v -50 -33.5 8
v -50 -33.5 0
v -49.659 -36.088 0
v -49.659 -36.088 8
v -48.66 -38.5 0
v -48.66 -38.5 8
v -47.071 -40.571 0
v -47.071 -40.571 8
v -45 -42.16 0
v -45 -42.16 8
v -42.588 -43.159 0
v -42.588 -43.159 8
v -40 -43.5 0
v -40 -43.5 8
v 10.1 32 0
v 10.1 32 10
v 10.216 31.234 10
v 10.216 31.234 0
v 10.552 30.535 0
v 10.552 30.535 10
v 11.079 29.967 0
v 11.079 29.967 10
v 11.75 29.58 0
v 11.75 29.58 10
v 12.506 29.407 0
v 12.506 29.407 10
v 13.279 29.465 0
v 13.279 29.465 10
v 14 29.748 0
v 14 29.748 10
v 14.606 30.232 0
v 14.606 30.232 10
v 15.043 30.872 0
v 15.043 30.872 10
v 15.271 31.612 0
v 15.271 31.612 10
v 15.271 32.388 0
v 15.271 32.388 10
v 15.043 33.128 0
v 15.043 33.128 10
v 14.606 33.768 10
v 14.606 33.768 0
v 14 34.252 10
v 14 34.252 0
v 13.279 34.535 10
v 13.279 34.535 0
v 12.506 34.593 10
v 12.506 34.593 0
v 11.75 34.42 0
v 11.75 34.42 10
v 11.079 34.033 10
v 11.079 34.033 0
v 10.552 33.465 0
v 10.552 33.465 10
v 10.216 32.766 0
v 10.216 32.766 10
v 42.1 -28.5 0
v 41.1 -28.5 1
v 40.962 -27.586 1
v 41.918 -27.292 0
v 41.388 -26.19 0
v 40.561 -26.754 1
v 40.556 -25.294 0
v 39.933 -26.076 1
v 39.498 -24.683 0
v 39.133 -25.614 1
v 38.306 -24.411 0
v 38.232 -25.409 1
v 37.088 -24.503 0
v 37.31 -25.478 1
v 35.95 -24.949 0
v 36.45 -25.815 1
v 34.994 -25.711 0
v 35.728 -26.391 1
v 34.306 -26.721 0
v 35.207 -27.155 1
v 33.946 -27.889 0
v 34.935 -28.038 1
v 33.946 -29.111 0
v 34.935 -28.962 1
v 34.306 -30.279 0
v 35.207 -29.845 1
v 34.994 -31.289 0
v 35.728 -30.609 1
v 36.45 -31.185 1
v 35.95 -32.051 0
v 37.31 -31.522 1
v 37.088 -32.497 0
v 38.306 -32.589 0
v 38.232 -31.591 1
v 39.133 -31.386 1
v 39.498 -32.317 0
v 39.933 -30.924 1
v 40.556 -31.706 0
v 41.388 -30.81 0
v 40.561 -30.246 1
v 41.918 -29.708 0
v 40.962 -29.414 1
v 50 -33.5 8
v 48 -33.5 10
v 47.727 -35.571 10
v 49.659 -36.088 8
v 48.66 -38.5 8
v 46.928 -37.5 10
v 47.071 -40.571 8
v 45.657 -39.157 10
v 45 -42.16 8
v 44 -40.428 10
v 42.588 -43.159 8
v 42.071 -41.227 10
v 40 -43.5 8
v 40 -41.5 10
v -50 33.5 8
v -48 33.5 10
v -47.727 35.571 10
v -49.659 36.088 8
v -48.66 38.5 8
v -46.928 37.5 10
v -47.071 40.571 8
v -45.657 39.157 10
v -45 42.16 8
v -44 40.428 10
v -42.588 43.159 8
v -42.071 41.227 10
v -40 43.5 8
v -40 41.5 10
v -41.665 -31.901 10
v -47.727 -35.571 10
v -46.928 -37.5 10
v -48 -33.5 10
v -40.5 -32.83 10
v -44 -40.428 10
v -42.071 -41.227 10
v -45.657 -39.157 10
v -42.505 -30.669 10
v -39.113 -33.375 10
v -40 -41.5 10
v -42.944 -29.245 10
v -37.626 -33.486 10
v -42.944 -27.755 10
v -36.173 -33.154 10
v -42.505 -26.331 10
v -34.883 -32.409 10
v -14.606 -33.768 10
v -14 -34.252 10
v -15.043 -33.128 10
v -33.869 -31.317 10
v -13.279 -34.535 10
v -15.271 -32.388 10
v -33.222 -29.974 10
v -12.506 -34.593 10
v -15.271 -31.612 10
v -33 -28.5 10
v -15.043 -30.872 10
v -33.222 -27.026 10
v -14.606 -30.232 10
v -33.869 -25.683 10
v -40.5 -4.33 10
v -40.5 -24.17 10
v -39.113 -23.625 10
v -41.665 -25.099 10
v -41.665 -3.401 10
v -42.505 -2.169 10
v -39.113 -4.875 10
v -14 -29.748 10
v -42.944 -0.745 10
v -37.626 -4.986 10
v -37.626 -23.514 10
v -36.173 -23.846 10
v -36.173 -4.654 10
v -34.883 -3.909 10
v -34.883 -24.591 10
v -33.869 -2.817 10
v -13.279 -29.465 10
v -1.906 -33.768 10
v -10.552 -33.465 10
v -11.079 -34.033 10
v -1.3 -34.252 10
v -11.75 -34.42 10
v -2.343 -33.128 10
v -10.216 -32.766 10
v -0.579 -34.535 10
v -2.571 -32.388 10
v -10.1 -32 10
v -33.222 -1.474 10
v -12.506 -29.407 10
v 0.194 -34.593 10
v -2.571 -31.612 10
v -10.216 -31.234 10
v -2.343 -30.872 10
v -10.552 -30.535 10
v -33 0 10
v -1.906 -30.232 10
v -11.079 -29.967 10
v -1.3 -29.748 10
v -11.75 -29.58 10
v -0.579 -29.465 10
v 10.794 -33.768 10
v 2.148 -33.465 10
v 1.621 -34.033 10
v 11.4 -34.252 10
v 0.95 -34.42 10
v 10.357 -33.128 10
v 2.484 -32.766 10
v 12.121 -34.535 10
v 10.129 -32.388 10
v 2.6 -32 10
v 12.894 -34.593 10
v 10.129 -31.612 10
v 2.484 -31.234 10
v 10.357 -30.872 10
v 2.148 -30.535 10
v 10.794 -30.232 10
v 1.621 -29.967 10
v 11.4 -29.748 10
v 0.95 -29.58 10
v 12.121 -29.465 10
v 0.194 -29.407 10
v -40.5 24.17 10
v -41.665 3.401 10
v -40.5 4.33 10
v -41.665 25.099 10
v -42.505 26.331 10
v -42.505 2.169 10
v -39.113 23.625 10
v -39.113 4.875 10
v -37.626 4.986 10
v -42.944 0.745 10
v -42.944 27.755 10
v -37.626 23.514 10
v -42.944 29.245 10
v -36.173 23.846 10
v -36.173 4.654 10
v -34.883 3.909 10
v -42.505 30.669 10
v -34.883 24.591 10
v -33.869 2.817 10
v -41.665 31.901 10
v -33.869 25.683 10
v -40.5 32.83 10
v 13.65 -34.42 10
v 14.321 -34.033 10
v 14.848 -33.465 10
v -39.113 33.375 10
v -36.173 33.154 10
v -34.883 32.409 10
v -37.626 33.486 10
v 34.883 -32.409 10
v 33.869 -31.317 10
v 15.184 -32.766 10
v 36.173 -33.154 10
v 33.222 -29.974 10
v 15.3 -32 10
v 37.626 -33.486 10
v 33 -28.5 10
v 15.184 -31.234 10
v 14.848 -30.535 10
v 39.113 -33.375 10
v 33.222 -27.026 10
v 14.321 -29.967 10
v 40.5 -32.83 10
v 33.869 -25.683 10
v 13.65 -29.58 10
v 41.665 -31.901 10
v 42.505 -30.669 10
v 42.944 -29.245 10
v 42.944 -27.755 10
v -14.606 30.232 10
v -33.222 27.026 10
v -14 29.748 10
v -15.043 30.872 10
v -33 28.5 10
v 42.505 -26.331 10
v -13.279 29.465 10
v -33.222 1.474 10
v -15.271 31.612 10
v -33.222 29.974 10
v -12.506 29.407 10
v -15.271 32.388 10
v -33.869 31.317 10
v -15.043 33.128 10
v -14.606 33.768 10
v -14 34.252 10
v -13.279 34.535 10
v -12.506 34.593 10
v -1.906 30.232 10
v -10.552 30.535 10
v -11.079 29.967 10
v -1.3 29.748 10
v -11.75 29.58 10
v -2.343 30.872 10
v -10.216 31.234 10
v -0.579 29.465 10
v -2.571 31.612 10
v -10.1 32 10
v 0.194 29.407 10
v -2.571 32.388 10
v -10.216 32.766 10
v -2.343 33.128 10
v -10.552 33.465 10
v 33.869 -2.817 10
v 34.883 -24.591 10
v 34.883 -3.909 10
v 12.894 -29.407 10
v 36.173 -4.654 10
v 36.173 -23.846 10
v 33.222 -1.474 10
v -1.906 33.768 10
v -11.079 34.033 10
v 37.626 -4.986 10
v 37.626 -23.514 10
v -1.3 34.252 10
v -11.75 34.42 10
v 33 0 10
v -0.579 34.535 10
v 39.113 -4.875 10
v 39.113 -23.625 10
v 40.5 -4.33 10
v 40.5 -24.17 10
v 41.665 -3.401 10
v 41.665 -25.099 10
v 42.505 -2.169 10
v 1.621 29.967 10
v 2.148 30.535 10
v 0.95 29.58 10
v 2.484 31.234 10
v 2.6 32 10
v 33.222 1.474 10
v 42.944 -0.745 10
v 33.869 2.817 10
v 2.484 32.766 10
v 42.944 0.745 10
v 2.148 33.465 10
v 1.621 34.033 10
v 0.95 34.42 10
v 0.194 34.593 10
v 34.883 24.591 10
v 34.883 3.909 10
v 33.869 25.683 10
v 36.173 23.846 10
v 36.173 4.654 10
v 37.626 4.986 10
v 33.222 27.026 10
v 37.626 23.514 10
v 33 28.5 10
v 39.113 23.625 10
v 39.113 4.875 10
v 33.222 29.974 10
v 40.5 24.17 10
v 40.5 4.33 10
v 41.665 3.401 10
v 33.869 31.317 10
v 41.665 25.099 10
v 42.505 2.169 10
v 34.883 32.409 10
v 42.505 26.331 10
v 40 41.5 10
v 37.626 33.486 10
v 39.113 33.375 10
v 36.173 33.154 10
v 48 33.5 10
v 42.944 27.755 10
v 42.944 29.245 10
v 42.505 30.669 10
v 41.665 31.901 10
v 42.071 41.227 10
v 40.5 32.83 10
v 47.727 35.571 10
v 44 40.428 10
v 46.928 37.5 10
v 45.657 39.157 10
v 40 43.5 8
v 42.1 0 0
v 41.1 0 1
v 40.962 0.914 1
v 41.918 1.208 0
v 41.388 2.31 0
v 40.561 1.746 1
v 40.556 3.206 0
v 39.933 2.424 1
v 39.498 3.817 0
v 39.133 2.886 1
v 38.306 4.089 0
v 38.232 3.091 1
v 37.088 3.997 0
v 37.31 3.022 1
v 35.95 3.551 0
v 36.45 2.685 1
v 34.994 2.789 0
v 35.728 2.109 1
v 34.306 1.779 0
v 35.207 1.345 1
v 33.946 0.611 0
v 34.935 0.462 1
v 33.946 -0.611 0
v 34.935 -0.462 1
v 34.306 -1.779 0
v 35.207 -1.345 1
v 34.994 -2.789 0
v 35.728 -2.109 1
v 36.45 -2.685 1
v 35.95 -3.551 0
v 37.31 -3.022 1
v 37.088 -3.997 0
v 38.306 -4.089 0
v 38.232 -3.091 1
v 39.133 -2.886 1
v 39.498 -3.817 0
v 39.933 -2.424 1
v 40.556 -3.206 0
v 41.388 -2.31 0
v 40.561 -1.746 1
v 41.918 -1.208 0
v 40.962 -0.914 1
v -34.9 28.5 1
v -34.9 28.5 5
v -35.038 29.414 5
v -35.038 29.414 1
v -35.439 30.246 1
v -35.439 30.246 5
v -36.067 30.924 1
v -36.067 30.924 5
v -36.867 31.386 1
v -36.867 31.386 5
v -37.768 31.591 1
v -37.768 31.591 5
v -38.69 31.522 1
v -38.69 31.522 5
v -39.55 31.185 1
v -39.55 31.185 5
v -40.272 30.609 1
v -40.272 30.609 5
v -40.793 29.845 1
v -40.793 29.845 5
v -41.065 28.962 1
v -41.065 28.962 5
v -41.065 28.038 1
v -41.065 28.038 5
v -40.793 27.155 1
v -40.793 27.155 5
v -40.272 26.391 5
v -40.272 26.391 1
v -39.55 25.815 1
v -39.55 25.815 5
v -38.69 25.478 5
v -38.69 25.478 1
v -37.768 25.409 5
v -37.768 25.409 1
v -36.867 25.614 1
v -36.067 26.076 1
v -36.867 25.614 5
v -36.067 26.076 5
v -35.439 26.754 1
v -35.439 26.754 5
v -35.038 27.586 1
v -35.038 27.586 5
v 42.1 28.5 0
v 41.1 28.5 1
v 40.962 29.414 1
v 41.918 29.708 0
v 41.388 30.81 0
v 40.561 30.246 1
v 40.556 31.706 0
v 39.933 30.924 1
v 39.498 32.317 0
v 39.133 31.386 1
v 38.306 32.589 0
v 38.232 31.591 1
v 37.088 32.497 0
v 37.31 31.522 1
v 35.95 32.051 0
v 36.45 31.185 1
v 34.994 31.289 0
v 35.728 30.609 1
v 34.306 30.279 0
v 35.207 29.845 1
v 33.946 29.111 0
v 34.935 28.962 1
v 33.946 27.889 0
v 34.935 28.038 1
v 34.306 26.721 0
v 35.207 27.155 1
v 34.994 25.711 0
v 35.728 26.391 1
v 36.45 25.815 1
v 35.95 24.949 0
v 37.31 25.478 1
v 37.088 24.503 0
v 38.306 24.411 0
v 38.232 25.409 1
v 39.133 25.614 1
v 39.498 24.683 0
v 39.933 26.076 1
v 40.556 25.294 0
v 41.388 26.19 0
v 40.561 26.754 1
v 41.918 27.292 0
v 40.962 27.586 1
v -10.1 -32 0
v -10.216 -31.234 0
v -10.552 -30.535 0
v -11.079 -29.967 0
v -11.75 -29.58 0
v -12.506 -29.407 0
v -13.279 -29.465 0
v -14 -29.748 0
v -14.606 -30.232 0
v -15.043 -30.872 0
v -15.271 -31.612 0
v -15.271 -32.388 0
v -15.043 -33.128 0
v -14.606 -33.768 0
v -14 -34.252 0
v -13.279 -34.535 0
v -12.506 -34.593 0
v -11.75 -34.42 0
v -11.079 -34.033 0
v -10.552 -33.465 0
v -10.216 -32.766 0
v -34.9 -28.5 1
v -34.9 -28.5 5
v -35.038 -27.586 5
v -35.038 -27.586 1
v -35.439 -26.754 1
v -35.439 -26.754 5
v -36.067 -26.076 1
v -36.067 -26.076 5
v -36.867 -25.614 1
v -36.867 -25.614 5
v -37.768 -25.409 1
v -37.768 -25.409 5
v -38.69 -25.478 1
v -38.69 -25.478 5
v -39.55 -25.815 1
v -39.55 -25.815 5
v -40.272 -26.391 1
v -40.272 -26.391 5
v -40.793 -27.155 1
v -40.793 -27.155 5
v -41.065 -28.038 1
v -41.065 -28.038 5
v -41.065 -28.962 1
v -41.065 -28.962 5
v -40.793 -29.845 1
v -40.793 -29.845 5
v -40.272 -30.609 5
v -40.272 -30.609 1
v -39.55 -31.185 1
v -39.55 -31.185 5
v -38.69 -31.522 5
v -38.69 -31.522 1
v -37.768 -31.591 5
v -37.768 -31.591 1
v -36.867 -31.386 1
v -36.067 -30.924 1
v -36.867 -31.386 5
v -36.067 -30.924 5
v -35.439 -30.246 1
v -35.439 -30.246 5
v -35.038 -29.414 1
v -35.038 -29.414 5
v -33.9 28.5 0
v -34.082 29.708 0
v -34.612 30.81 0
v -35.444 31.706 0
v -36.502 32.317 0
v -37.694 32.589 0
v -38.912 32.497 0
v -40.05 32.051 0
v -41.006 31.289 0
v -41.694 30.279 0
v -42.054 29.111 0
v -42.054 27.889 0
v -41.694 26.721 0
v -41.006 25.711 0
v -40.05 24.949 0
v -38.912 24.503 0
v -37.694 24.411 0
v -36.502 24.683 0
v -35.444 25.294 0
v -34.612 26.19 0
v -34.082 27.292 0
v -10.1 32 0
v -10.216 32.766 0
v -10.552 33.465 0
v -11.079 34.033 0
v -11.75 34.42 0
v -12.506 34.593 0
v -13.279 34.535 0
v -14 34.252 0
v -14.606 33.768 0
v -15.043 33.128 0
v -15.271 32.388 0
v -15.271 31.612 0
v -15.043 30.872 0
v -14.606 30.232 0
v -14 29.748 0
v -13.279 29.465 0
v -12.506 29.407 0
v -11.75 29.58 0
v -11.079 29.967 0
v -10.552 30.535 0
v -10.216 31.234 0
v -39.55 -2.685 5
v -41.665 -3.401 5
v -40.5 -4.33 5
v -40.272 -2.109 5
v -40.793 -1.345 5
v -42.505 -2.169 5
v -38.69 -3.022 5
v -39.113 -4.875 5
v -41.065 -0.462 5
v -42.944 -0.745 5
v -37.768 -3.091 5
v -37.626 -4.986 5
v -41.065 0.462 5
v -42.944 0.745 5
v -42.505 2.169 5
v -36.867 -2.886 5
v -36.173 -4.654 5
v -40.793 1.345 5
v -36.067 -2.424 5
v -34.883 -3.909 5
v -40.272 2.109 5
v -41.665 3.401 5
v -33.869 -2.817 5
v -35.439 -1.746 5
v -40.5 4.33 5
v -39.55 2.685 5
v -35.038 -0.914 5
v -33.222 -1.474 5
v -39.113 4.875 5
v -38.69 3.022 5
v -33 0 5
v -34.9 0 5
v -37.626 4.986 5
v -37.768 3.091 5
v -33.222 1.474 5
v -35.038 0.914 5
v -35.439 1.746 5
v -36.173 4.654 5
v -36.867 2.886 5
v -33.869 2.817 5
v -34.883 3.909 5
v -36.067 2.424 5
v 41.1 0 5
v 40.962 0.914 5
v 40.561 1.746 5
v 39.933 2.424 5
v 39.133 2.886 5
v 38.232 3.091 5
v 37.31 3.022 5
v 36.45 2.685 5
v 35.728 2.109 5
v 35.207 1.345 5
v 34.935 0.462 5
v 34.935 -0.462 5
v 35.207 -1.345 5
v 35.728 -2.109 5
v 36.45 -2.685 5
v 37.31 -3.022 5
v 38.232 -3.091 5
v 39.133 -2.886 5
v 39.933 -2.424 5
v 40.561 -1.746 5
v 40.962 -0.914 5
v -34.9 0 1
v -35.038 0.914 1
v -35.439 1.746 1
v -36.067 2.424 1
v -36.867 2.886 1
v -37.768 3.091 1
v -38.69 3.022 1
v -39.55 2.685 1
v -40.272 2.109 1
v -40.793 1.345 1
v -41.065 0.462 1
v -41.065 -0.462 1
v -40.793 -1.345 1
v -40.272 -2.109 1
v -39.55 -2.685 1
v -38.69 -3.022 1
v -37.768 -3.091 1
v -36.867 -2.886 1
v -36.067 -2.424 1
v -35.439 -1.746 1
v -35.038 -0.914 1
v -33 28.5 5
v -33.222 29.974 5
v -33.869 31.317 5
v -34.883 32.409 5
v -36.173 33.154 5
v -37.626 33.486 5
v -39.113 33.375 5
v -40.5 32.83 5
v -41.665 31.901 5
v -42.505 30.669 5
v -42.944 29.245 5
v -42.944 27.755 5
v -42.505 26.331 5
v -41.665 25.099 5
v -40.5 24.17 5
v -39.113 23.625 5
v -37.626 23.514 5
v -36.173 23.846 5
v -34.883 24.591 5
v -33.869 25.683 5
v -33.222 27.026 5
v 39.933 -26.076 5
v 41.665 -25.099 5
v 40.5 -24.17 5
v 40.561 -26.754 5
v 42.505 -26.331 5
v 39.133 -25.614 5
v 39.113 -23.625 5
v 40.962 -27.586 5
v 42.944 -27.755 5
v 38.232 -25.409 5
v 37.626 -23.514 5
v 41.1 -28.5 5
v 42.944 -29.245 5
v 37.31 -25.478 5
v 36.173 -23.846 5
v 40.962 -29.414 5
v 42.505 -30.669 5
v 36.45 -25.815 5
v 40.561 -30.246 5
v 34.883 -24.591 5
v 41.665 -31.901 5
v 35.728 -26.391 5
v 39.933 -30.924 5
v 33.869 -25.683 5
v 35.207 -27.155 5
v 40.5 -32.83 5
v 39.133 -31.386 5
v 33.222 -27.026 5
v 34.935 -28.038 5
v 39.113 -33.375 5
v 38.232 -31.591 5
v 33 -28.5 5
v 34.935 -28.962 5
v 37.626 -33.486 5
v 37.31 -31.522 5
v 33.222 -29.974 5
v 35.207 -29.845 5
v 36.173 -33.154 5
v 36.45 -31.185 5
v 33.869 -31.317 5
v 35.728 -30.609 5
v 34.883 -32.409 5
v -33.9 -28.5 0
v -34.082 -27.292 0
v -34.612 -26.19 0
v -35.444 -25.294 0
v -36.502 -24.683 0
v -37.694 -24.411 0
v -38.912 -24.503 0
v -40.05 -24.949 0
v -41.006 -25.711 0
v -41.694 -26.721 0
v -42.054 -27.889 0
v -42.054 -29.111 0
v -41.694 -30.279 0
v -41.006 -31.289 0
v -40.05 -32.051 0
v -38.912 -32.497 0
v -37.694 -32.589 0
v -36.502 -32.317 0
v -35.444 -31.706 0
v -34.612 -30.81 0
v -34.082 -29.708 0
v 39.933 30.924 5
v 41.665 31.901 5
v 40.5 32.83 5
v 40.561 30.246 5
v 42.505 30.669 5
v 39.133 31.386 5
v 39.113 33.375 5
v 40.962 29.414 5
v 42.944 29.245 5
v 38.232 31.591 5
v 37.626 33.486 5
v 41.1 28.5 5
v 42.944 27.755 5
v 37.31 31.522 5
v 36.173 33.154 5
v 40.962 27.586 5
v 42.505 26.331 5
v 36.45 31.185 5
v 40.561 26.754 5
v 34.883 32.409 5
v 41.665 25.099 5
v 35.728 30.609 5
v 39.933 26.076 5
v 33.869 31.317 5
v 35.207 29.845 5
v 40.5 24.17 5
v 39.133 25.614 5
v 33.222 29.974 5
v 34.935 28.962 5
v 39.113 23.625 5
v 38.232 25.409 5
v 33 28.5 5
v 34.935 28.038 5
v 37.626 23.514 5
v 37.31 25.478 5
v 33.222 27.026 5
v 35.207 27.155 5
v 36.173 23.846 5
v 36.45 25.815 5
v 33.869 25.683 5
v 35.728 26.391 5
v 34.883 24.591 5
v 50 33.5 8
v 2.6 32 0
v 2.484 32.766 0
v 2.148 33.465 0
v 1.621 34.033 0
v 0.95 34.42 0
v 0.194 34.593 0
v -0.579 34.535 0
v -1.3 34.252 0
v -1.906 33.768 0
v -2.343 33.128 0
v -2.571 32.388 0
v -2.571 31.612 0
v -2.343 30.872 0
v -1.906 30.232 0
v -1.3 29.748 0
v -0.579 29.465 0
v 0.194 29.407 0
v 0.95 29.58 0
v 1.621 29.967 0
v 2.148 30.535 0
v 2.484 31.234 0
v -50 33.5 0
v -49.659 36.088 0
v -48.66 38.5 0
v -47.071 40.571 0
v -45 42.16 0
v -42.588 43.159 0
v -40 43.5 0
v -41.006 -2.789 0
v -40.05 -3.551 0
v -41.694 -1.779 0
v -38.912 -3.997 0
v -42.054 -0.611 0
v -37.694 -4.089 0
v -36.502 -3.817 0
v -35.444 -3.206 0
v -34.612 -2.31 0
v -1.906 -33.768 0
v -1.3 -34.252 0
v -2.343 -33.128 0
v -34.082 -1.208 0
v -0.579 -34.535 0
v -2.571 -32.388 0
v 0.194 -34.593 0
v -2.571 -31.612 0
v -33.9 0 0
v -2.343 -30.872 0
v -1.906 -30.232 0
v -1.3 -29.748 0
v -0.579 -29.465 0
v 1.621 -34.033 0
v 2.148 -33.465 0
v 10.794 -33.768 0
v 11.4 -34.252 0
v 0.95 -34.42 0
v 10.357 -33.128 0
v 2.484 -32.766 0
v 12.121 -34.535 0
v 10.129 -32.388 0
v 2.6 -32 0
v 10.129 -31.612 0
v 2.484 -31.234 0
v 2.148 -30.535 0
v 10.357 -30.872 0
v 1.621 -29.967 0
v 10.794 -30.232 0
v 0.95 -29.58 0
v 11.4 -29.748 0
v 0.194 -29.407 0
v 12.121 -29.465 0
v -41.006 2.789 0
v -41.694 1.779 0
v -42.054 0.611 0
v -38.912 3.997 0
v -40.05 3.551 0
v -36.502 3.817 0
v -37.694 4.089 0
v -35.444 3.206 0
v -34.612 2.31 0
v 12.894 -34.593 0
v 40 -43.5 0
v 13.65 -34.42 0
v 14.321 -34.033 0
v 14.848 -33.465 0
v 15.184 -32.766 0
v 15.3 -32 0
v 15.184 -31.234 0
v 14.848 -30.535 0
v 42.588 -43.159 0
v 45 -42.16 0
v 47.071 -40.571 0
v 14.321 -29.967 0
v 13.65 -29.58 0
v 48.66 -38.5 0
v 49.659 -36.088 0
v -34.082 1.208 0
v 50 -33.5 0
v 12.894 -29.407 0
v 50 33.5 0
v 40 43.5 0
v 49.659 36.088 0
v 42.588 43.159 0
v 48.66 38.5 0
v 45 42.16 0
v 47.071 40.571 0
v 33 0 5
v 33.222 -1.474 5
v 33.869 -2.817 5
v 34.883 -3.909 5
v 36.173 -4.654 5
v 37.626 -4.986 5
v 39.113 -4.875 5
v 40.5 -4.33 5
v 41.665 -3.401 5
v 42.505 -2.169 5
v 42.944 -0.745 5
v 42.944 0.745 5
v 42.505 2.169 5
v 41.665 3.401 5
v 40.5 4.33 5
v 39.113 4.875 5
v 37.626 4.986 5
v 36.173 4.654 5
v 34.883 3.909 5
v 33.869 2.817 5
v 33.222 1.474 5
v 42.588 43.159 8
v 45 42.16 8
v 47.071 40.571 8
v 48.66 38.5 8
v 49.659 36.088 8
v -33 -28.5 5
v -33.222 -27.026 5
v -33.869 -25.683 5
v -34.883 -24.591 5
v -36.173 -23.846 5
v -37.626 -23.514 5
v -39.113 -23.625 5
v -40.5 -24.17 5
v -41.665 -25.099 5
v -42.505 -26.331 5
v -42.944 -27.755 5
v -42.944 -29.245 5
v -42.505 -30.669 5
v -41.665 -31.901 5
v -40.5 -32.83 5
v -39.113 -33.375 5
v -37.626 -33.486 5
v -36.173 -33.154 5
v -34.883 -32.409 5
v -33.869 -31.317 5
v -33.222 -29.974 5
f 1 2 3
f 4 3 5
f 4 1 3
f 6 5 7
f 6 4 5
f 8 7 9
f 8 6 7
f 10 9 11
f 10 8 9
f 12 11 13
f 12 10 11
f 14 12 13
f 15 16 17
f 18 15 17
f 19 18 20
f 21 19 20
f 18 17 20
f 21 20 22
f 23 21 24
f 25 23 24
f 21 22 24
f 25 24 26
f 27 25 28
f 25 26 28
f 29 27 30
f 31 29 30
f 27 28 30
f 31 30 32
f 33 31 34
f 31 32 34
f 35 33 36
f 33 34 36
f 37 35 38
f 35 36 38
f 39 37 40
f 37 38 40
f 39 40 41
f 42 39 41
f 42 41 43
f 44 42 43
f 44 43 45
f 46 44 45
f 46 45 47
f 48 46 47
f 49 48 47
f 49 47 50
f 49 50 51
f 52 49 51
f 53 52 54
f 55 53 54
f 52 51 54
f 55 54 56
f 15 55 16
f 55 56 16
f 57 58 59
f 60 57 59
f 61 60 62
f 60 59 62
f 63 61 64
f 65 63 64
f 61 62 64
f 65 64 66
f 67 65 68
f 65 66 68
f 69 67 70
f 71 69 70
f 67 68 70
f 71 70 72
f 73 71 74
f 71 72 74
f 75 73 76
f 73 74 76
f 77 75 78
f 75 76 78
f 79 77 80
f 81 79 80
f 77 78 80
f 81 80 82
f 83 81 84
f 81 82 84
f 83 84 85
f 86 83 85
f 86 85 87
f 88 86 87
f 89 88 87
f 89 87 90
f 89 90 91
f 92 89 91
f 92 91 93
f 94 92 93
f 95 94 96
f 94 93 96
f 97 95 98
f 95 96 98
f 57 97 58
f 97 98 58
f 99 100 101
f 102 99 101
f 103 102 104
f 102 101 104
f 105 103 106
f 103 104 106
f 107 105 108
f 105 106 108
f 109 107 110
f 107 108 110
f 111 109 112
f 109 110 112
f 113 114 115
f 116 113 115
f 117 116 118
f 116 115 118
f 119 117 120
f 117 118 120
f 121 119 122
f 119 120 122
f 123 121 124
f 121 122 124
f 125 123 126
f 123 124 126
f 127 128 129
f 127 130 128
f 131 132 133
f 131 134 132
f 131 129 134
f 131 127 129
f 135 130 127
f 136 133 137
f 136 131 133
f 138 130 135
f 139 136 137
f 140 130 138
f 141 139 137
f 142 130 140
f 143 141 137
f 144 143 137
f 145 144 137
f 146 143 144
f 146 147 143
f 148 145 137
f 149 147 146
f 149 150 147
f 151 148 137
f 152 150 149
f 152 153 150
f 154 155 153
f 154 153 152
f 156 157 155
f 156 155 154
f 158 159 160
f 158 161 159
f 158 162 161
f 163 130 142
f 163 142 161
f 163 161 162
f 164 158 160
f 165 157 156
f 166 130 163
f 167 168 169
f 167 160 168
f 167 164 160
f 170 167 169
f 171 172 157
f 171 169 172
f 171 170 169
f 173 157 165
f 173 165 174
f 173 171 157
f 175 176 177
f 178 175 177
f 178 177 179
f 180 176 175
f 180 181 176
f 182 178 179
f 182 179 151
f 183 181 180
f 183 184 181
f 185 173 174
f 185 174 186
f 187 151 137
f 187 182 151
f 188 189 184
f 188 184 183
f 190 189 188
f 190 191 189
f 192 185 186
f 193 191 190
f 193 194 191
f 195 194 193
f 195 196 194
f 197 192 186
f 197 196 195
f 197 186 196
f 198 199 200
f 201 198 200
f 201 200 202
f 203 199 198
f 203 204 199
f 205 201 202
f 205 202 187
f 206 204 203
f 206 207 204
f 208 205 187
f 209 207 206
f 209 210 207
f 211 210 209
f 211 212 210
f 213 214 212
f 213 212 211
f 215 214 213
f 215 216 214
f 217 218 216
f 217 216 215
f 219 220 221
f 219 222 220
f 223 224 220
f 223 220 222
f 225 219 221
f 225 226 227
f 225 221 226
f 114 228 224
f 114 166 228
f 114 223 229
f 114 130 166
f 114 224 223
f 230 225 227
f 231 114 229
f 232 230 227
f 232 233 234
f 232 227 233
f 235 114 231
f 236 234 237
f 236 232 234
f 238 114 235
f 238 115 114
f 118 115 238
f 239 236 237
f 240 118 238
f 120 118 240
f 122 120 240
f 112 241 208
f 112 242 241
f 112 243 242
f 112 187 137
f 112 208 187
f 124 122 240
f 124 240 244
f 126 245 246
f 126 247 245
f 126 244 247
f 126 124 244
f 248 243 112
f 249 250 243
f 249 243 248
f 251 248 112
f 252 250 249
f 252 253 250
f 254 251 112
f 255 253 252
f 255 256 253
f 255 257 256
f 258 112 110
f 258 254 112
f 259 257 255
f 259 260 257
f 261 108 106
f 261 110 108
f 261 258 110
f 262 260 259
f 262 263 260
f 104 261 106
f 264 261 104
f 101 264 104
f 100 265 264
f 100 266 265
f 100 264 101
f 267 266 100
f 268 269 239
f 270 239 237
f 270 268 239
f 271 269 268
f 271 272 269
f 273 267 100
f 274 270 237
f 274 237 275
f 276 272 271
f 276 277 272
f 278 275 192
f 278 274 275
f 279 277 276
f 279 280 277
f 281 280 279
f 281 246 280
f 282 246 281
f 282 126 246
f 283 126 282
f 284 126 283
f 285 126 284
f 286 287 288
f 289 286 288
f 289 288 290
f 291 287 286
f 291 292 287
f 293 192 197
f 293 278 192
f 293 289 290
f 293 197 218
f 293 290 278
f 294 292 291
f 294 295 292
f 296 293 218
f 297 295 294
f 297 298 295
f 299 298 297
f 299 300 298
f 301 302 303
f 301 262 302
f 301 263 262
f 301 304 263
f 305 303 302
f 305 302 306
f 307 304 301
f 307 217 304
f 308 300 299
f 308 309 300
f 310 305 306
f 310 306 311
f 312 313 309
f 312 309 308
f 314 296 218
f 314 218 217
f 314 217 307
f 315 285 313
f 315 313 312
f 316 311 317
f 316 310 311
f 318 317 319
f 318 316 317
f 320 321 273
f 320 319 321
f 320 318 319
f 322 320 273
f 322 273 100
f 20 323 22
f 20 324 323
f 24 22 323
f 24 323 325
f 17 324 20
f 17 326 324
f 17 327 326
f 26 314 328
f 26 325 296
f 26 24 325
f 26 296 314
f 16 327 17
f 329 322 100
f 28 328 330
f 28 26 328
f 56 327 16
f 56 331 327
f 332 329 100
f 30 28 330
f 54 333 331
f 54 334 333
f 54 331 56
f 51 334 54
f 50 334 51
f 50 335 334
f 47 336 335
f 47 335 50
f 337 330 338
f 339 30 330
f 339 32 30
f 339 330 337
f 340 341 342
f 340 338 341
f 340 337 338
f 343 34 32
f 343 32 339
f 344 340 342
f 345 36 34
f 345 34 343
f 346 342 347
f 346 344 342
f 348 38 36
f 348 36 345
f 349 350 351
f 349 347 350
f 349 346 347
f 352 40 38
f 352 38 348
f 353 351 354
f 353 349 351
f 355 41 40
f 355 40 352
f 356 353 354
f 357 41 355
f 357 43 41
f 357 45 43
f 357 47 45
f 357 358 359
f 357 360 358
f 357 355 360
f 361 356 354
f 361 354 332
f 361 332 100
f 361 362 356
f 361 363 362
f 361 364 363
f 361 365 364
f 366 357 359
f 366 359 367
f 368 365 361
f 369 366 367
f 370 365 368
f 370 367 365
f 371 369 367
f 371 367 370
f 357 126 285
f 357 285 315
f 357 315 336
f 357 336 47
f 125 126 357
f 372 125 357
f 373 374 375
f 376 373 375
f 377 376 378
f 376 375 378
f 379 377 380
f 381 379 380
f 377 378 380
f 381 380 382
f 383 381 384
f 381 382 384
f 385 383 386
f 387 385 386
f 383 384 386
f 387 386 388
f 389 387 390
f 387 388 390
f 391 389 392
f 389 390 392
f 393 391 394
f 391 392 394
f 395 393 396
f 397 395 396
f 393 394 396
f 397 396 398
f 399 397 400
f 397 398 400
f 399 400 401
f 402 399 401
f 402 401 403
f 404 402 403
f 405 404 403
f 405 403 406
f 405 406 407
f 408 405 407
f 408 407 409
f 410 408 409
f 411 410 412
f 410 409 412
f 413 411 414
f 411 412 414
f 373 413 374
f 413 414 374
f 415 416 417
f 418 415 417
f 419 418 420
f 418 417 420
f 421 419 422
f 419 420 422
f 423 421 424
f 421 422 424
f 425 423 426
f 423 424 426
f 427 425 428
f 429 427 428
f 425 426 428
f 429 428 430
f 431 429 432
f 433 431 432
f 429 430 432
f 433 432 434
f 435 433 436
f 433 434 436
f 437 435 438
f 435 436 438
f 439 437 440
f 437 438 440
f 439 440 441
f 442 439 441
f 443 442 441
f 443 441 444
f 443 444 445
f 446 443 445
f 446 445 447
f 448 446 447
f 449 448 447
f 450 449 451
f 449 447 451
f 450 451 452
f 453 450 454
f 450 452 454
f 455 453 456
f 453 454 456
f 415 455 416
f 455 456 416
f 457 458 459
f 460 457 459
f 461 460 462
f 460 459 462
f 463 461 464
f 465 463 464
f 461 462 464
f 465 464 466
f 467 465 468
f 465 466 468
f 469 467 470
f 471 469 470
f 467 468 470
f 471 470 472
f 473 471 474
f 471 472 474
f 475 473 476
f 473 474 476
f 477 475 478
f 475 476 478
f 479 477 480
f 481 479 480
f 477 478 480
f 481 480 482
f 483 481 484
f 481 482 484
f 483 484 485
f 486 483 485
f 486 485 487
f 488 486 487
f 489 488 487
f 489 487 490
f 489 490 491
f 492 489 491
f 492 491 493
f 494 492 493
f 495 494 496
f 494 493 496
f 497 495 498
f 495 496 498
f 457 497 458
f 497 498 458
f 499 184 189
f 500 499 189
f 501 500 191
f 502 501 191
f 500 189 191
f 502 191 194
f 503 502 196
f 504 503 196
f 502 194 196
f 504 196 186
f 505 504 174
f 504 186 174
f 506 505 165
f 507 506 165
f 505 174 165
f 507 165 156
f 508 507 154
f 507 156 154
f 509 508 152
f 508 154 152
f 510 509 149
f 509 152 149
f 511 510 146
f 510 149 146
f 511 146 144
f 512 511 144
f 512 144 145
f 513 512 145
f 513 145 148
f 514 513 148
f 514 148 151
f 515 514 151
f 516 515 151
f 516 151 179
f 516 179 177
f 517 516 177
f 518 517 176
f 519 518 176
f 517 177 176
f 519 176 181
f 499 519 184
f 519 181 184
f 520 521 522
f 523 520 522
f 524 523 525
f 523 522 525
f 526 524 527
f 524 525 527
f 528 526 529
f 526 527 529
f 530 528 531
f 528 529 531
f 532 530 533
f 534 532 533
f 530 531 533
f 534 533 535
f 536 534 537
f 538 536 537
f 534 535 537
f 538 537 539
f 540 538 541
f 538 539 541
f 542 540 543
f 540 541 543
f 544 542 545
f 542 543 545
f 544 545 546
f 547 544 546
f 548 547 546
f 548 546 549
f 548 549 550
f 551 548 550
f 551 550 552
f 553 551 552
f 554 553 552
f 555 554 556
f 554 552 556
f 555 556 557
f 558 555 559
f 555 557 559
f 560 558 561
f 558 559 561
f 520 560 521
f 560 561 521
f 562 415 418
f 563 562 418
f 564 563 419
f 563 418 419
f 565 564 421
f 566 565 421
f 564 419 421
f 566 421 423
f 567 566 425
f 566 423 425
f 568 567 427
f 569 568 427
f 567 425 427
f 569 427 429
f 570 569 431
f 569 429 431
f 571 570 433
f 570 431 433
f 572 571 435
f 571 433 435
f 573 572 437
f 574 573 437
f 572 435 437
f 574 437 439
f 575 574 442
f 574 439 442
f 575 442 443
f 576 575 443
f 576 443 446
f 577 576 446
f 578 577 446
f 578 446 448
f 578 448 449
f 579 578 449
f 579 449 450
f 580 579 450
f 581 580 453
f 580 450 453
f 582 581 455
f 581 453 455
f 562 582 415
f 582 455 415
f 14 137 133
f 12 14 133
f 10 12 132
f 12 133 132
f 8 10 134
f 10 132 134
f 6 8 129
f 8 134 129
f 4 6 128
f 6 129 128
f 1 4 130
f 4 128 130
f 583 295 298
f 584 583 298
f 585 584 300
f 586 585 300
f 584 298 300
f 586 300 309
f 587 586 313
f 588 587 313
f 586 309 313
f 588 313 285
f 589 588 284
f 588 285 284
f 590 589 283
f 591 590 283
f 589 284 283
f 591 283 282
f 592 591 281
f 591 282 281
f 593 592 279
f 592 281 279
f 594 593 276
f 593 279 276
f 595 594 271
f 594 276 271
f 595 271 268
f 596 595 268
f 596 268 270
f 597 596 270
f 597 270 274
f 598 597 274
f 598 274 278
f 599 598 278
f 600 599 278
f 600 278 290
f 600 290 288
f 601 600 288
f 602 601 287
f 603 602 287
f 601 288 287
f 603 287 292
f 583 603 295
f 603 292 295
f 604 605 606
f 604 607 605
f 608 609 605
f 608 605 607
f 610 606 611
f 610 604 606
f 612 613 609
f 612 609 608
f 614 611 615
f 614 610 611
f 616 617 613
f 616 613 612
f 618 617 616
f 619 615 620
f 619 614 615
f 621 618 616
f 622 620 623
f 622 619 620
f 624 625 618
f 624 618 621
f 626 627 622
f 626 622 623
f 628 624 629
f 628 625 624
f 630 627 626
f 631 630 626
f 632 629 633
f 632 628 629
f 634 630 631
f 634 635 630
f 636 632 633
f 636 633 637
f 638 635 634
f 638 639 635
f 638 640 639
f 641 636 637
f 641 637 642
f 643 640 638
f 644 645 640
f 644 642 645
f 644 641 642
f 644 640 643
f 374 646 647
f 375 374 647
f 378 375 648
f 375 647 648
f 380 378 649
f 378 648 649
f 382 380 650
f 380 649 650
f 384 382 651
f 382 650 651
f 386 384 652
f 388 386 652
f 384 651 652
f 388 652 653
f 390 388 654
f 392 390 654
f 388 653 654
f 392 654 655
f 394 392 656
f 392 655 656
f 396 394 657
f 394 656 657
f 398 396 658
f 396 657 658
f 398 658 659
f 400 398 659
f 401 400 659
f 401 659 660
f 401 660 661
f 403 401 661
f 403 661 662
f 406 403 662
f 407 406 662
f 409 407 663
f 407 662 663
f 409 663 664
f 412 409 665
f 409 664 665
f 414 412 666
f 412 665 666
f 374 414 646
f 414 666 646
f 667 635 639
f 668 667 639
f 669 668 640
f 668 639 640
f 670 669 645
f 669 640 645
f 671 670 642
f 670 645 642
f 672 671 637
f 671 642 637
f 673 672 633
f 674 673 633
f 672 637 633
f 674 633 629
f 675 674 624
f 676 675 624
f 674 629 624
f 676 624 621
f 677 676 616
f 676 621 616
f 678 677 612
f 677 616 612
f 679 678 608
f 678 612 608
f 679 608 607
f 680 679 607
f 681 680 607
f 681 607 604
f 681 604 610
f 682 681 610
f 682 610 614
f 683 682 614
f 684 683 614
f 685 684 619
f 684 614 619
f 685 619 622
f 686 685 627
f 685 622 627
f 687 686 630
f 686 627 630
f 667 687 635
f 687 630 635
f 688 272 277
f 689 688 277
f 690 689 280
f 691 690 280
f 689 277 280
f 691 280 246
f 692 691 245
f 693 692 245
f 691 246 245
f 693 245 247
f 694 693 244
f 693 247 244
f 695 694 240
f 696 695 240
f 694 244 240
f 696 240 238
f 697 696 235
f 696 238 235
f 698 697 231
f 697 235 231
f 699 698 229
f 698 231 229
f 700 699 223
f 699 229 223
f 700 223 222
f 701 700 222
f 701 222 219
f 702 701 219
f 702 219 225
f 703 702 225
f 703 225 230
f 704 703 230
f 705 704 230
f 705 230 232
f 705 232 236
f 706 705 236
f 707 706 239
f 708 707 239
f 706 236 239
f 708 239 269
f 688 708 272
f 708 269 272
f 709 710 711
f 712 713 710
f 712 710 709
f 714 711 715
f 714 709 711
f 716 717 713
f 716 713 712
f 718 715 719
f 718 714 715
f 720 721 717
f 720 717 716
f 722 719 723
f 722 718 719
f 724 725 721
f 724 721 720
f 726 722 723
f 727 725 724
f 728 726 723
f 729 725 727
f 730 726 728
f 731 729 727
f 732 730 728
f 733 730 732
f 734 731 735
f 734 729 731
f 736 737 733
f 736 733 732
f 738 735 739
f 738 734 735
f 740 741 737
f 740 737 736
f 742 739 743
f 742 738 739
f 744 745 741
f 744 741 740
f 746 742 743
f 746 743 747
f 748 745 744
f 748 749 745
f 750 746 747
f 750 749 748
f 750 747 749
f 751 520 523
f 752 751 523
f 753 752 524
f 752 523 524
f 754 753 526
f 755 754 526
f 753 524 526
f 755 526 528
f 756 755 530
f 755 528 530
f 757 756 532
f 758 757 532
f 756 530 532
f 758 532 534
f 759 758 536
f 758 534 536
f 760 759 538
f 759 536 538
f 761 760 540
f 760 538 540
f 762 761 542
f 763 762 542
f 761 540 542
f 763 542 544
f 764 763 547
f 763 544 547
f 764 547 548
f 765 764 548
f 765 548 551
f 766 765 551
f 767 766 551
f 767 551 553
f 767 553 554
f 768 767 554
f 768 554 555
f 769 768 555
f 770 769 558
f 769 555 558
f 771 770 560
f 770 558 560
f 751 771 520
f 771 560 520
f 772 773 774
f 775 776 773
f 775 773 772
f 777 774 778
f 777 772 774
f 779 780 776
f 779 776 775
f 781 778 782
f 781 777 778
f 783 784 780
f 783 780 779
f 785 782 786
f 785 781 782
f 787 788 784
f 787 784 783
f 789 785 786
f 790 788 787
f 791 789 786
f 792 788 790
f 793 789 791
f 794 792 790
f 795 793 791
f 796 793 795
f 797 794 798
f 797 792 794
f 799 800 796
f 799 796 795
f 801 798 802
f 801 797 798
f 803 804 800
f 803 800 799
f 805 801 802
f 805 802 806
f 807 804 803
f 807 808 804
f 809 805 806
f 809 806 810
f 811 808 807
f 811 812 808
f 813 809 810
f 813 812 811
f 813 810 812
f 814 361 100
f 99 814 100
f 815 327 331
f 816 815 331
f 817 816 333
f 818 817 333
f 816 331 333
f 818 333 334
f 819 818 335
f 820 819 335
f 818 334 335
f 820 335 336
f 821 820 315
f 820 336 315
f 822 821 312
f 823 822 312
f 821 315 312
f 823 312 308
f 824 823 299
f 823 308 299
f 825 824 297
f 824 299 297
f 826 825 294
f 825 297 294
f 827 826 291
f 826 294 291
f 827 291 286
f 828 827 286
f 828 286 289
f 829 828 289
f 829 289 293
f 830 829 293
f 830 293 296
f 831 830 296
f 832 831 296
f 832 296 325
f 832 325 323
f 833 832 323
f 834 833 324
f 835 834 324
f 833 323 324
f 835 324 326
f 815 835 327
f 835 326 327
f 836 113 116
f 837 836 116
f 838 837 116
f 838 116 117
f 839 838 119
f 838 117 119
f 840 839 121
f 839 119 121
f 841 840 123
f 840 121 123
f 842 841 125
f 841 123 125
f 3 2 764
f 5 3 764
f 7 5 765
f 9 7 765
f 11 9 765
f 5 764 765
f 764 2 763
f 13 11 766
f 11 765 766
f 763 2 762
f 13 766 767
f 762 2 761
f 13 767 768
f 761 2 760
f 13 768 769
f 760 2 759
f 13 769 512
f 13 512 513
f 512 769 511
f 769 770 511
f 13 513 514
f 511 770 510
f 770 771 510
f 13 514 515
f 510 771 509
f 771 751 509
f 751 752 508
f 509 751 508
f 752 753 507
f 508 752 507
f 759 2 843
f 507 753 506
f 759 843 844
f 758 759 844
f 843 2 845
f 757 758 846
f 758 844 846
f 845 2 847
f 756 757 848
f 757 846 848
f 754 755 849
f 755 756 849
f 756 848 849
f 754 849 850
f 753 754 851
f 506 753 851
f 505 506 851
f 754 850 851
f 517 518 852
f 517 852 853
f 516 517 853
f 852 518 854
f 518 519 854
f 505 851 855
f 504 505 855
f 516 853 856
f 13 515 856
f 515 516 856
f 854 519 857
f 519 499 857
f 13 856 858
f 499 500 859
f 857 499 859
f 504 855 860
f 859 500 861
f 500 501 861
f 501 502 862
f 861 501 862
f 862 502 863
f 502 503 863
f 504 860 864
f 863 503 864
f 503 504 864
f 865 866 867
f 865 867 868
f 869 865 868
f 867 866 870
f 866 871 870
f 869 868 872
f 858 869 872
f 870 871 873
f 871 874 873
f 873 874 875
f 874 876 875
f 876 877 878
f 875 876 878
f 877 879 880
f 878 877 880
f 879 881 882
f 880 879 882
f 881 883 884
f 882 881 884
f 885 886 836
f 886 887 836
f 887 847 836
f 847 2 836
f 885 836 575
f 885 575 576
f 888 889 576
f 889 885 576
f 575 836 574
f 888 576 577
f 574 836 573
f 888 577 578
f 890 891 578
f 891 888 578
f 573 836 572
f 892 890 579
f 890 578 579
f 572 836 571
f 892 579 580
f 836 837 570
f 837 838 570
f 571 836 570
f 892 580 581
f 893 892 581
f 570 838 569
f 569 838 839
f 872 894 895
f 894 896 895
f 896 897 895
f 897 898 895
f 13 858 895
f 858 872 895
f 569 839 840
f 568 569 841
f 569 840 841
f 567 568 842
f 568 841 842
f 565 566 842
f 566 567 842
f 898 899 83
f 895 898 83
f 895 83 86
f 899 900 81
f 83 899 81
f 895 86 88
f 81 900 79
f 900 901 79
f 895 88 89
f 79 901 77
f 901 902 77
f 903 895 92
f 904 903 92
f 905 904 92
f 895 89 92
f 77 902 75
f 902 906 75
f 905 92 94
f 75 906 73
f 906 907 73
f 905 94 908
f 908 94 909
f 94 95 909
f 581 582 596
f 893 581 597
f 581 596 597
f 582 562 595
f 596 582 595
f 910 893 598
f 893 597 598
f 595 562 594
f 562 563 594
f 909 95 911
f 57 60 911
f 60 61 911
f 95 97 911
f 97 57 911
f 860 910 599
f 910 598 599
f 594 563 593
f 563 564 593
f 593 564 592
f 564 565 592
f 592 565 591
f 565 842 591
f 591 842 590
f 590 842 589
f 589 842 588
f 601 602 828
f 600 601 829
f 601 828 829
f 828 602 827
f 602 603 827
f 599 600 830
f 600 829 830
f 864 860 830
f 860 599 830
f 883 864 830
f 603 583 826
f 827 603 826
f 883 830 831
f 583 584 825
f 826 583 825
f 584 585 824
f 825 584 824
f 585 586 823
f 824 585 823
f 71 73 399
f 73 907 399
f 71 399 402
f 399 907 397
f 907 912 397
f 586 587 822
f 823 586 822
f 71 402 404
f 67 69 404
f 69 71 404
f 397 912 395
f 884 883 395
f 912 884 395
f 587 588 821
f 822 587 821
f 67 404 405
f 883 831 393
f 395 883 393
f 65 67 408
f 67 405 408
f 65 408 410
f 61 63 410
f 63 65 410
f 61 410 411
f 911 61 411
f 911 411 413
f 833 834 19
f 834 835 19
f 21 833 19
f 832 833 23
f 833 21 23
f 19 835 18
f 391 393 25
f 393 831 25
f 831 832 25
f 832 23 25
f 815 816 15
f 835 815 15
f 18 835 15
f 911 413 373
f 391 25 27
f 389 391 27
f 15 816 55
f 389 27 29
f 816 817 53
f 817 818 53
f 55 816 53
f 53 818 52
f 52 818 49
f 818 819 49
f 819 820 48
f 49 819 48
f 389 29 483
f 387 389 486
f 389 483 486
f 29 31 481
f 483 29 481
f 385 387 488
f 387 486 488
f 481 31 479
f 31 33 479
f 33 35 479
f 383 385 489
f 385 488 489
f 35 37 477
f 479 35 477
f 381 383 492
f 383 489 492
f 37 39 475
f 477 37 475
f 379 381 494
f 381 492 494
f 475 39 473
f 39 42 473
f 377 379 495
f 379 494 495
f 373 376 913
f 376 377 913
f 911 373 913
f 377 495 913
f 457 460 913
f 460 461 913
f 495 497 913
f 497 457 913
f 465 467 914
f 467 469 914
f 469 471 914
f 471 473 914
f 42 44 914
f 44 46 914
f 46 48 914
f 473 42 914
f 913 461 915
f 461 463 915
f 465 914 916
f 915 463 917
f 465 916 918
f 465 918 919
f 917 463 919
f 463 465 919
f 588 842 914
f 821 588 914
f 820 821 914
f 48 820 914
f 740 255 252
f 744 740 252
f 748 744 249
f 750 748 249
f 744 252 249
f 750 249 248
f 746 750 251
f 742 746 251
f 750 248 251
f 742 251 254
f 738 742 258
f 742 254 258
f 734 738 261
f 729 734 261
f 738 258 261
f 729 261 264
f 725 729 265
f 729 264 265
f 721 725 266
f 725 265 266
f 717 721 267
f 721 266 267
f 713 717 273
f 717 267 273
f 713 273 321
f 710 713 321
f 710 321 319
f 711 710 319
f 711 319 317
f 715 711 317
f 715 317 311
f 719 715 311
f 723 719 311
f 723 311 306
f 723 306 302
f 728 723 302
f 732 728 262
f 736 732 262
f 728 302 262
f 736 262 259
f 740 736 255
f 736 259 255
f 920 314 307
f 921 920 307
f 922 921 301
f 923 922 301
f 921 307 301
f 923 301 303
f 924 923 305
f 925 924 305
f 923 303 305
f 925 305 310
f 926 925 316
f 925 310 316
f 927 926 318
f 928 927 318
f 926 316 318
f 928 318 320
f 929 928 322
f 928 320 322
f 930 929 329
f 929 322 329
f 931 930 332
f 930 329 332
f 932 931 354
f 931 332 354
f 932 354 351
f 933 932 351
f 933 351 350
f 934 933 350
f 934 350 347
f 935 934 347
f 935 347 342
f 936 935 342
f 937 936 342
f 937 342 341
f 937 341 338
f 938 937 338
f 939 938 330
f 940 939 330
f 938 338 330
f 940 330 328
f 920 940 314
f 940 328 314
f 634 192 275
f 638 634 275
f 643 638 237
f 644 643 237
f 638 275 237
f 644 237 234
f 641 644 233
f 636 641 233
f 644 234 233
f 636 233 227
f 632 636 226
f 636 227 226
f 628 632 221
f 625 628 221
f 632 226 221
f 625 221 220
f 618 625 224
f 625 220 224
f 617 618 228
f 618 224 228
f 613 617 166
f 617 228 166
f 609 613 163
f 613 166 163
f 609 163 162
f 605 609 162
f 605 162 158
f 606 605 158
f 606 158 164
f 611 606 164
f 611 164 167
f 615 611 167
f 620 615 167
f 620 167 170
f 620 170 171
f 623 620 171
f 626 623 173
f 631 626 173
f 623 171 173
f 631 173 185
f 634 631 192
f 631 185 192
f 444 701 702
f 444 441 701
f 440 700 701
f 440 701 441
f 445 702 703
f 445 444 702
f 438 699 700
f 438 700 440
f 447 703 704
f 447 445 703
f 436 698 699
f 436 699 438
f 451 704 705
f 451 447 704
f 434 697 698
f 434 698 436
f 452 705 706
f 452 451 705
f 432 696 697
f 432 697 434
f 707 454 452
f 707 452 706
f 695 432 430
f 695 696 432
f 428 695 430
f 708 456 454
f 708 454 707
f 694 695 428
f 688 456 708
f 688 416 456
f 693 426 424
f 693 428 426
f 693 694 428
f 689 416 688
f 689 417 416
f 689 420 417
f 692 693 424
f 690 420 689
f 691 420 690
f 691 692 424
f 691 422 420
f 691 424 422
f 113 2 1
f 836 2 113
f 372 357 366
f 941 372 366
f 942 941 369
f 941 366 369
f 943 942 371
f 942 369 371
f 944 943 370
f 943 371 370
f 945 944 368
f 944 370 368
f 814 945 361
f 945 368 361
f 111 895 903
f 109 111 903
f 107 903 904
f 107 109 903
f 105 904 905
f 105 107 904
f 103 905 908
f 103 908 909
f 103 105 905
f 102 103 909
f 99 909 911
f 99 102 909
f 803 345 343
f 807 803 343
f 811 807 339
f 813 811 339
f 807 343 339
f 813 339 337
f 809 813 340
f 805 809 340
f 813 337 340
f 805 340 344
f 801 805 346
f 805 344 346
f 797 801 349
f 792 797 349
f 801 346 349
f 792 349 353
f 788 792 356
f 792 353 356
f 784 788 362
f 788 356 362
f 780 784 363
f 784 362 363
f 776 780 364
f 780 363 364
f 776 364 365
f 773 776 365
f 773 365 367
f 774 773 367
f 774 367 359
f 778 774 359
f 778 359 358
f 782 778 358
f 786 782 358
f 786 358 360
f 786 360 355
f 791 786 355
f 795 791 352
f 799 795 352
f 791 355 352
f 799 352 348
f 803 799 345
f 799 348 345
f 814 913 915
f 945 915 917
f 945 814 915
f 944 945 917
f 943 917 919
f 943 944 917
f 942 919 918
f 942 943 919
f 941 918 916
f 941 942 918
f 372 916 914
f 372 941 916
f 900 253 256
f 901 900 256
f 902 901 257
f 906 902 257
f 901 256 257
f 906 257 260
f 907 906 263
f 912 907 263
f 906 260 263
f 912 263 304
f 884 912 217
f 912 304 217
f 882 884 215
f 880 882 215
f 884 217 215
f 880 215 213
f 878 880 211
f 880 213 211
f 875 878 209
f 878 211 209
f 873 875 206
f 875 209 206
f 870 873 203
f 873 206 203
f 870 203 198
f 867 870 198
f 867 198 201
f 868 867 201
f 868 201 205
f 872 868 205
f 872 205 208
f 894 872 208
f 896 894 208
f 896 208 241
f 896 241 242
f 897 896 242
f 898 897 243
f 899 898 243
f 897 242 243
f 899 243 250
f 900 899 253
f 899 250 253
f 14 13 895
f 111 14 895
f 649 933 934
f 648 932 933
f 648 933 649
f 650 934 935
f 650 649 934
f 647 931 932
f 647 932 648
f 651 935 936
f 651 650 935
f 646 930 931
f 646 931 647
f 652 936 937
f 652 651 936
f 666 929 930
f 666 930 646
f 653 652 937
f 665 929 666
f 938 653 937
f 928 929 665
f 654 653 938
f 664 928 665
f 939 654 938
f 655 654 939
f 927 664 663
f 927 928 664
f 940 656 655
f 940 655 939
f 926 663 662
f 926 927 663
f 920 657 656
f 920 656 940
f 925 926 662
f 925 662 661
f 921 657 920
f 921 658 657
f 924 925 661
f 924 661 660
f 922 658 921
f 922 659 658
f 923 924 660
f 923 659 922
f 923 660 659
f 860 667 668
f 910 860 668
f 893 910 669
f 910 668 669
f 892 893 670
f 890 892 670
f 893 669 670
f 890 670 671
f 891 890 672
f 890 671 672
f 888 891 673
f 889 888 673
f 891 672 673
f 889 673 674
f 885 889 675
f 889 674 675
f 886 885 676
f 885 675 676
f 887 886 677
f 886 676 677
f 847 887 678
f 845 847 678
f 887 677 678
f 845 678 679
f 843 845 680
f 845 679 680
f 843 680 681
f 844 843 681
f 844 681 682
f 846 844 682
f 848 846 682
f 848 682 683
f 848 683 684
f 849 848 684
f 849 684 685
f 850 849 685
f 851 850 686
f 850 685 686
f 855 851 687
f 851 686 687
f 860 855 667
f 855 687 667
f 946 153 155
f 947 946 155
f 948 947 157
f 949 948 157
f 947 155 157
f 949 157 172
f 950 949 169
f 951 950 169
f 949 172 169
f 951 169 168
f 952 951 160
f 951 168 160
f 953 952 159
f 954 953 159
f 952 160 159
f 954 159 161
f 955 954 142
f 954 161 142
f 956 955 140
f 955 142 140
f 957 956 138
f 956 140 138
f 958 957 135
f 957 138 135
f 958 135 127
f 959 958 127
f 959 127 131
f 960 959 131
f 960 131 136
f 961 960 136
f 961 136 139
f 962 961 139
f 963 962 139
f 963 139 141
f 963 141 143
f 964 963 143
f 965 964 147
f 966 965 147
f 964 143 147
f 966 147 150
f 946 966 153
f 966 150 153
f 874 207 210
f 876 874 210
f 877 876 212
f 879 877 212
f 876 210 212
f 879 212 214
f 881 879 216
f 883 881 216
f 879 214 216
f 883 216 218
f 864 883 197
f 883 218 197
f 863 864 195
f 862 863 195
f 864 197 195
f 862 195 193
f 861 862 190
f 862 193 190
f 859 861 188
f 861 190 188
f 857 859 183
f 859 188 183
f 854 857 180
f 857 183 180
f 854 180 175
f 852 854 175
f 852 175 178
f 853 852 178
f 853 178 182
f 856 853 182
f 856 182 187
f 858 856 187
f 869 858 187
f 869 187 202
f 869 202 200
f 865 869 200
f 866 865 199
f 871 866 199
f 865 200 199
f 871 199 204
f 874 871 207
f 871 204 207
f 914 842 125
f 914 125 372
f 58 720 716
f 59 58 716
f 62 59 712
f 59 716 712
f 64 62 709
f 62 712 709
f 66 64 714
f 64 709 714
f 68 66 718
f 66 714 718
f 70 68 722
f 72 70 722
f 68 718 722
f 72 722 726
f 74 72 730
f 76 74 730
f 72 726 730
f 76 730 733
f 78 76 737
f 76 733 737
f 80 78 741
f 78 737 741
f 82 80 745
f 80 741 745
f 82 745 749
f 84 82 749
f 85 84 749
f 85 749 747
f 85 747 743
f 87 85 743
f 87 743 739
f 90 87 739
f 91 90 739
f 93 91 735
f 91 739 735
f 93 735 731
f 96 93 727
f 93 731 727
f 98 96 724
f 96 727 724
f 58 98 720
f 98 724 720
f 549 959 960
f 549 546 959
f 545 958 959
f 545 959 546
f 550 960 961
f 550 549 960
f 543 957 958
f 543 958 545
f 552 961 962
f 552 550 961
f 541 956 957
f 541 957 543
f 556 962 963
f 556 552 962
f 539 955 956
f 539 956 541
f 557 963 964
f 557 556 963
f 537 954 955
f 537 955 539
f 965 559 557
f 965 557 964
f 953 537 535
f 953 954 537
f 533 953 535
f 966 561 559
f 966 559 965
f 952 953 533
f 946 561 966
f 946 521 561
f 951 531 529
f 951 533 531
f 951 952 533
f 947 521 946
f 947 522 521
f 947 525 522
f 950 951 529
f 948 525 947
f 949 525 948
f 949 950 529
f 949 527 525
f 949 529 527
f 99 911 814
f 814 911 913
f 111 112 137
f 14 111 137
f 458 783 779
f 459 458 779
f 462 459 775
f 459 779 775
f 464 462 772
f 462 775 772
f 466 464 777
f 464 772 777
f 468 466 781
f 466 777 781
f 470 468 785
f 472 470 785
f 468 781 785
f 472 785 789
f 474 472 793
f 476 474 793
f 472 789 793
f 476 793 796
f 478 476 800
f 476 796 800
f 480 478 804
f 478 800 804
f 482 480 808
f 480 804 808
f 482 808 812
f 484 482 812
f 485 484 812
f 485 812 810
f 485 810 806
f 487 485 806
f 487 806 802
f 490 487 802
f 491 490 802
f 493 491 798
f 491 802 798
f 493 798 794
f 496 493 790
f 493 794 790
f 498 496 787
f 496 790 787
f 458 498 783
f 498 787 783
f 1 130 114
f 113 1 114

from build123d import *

# Parameters (mm, degrees)
SKETCH_1_W          = 100
SKETCH_1_H          = 87
EXTRUDE_1_DEPTH     = 10
FILLET_1_R          = 10
SKETCH_2_R          = 2.6
CUT_EXTRUDE_1_DEPTH = 10
SKETCH_3_R          = 5
CUT_EXTRUDE_2_DEPTH = 5
SKETCH_4_R          = 3.1
CUT_EXTRUDE_3_DEPTH = 5
CHAMFER_1_SIZE      = 1
CHAMFER_2_SIZE      = 2


with BuildPart() as part:
    # 草图1 → 凸台-拉伸1 (new body)
    with BuildSketch(Plane.XY):
        Rectangle(SKETCH_1_W, SKETCH_1_H)
    extrude(amount=EXTRUDE_1_DEPTH)

    # 圆角1
    fillet_1_edges = [part.edges().sort_by_distance(p)[0] for p in [
        (50, -43.5, 5),
        (-50, -43.5, 5),
        (-50, 43.5, 5),
        (50, 43.5, 5),
    ]]
    fillet(fillet_1_edges, radius=FILLET_1_R)

    # 草图2 → 切除-拉伸1 (cut)
    with BuildSketch(Plane.XY.offset(10)):
        with Locations((0, 32)):
            Circle(SKETCH_2_R)
        with Locations((-12.7, 32)):
            Circle(SKETCH_2_R)
        with Locations(Location((12.7, 32, 0), (0, 0, 180))):
            Circle(SKETCH_2_R)
        with Locations((-12.7, -32)):
            Circle(SKETCH_2_R)
        with Locations((0, -32)):
            Circle(SKETCH_2_R)
        with Locations((12.7, -32)):
            Circle(SKETCH_2_R)
    extrude(amount=-CUT_EXTRUDE_1_DEPTH, mode=Mode.SUBTRACT)

    # 草图3 → 切除-拉伸2 (cut)
    with BuildSketch(Plane.XY.offset(10)):
        with Locations((-38, 28.5)):
            Circle(SKETCH_3_R)
        with Locations((-38, 0)):
            Circle(SKETCH_3_R)
        with Locations((-38, -28.5)):
            Circle(SKETCH_3_R)
        with Locations(Location((38, -28.5, 0), (0, 0, 180))):
            Circle(SKETCH_3_R)
        with Locations(Location((38, 0, 0), (0, 0, 180))):
            Circle(SKETCH_3_R)
        with Locations(Location((38, 28.5, 0), (0, 0, 180))):
            Circle(SKETCH_3_R)
    extrude(amount=-CUT_EXTRUDE_2_DEPTH, mode=Mode.SUBTRACT)

    # 草图4 → 切除-拉伸3 (cut)
    with BuildSketch(Plane.XY.offset(5)):
        with Locations((-38, 28.5)):
            Circle(SKETCH_4_R)
        with Locations((-38, 0)):
            Circle(SKETCH_4_R)
        with Locations((-38, -28.5)):
            Circle(SKETCH_4_R)
        with Locations((38, 28.5)):
            Circle(SKETCH_4_R)
        with Locations((38, 0)):
            Circle(SKETCH_4_R)
        with Locations((38, -28.5)):
            Circle(SKETCH_4_R)
    extrude(amount=-CUT_EXTRUDE_3_DEPTH, mode=Mode.SUBTRACT)

    # 倒角1
    chamfer_1_edges = [part.edges().sort_by_distance(p)[0] for p in [
        (34.9, 0, 0),
        (34.9, -28.5, 0),
        (-41.1, 28.5, 0),
        (-41.1, 0, 0),
        (-41.1, -28.5, 0),
        (34.9, 28.5, 0),
    ]]
    chamfer(chamfer_1_edges, length=CHAMFER_1_SIZE)

    # 倒角2
    chamfer_2_edges = [part.edges().sort_by_distance(p)[0] for p in [
        (0, 43.5, 10),
        (50, 0, 10),
        (-50, 0, 10),
        (0, -43.5, 10),
        (-47.071067812, -40.571067812, 10),
        (47.071067812, -40.571067812, 10),
        (-47.071067812, 40.571067812, 10),
        (47.071067812, 40.571067812, 10),
    ]]
    chamfer(chamfer_2_edges, length=CHAMFER_2_SIZE)


solid = part.part
